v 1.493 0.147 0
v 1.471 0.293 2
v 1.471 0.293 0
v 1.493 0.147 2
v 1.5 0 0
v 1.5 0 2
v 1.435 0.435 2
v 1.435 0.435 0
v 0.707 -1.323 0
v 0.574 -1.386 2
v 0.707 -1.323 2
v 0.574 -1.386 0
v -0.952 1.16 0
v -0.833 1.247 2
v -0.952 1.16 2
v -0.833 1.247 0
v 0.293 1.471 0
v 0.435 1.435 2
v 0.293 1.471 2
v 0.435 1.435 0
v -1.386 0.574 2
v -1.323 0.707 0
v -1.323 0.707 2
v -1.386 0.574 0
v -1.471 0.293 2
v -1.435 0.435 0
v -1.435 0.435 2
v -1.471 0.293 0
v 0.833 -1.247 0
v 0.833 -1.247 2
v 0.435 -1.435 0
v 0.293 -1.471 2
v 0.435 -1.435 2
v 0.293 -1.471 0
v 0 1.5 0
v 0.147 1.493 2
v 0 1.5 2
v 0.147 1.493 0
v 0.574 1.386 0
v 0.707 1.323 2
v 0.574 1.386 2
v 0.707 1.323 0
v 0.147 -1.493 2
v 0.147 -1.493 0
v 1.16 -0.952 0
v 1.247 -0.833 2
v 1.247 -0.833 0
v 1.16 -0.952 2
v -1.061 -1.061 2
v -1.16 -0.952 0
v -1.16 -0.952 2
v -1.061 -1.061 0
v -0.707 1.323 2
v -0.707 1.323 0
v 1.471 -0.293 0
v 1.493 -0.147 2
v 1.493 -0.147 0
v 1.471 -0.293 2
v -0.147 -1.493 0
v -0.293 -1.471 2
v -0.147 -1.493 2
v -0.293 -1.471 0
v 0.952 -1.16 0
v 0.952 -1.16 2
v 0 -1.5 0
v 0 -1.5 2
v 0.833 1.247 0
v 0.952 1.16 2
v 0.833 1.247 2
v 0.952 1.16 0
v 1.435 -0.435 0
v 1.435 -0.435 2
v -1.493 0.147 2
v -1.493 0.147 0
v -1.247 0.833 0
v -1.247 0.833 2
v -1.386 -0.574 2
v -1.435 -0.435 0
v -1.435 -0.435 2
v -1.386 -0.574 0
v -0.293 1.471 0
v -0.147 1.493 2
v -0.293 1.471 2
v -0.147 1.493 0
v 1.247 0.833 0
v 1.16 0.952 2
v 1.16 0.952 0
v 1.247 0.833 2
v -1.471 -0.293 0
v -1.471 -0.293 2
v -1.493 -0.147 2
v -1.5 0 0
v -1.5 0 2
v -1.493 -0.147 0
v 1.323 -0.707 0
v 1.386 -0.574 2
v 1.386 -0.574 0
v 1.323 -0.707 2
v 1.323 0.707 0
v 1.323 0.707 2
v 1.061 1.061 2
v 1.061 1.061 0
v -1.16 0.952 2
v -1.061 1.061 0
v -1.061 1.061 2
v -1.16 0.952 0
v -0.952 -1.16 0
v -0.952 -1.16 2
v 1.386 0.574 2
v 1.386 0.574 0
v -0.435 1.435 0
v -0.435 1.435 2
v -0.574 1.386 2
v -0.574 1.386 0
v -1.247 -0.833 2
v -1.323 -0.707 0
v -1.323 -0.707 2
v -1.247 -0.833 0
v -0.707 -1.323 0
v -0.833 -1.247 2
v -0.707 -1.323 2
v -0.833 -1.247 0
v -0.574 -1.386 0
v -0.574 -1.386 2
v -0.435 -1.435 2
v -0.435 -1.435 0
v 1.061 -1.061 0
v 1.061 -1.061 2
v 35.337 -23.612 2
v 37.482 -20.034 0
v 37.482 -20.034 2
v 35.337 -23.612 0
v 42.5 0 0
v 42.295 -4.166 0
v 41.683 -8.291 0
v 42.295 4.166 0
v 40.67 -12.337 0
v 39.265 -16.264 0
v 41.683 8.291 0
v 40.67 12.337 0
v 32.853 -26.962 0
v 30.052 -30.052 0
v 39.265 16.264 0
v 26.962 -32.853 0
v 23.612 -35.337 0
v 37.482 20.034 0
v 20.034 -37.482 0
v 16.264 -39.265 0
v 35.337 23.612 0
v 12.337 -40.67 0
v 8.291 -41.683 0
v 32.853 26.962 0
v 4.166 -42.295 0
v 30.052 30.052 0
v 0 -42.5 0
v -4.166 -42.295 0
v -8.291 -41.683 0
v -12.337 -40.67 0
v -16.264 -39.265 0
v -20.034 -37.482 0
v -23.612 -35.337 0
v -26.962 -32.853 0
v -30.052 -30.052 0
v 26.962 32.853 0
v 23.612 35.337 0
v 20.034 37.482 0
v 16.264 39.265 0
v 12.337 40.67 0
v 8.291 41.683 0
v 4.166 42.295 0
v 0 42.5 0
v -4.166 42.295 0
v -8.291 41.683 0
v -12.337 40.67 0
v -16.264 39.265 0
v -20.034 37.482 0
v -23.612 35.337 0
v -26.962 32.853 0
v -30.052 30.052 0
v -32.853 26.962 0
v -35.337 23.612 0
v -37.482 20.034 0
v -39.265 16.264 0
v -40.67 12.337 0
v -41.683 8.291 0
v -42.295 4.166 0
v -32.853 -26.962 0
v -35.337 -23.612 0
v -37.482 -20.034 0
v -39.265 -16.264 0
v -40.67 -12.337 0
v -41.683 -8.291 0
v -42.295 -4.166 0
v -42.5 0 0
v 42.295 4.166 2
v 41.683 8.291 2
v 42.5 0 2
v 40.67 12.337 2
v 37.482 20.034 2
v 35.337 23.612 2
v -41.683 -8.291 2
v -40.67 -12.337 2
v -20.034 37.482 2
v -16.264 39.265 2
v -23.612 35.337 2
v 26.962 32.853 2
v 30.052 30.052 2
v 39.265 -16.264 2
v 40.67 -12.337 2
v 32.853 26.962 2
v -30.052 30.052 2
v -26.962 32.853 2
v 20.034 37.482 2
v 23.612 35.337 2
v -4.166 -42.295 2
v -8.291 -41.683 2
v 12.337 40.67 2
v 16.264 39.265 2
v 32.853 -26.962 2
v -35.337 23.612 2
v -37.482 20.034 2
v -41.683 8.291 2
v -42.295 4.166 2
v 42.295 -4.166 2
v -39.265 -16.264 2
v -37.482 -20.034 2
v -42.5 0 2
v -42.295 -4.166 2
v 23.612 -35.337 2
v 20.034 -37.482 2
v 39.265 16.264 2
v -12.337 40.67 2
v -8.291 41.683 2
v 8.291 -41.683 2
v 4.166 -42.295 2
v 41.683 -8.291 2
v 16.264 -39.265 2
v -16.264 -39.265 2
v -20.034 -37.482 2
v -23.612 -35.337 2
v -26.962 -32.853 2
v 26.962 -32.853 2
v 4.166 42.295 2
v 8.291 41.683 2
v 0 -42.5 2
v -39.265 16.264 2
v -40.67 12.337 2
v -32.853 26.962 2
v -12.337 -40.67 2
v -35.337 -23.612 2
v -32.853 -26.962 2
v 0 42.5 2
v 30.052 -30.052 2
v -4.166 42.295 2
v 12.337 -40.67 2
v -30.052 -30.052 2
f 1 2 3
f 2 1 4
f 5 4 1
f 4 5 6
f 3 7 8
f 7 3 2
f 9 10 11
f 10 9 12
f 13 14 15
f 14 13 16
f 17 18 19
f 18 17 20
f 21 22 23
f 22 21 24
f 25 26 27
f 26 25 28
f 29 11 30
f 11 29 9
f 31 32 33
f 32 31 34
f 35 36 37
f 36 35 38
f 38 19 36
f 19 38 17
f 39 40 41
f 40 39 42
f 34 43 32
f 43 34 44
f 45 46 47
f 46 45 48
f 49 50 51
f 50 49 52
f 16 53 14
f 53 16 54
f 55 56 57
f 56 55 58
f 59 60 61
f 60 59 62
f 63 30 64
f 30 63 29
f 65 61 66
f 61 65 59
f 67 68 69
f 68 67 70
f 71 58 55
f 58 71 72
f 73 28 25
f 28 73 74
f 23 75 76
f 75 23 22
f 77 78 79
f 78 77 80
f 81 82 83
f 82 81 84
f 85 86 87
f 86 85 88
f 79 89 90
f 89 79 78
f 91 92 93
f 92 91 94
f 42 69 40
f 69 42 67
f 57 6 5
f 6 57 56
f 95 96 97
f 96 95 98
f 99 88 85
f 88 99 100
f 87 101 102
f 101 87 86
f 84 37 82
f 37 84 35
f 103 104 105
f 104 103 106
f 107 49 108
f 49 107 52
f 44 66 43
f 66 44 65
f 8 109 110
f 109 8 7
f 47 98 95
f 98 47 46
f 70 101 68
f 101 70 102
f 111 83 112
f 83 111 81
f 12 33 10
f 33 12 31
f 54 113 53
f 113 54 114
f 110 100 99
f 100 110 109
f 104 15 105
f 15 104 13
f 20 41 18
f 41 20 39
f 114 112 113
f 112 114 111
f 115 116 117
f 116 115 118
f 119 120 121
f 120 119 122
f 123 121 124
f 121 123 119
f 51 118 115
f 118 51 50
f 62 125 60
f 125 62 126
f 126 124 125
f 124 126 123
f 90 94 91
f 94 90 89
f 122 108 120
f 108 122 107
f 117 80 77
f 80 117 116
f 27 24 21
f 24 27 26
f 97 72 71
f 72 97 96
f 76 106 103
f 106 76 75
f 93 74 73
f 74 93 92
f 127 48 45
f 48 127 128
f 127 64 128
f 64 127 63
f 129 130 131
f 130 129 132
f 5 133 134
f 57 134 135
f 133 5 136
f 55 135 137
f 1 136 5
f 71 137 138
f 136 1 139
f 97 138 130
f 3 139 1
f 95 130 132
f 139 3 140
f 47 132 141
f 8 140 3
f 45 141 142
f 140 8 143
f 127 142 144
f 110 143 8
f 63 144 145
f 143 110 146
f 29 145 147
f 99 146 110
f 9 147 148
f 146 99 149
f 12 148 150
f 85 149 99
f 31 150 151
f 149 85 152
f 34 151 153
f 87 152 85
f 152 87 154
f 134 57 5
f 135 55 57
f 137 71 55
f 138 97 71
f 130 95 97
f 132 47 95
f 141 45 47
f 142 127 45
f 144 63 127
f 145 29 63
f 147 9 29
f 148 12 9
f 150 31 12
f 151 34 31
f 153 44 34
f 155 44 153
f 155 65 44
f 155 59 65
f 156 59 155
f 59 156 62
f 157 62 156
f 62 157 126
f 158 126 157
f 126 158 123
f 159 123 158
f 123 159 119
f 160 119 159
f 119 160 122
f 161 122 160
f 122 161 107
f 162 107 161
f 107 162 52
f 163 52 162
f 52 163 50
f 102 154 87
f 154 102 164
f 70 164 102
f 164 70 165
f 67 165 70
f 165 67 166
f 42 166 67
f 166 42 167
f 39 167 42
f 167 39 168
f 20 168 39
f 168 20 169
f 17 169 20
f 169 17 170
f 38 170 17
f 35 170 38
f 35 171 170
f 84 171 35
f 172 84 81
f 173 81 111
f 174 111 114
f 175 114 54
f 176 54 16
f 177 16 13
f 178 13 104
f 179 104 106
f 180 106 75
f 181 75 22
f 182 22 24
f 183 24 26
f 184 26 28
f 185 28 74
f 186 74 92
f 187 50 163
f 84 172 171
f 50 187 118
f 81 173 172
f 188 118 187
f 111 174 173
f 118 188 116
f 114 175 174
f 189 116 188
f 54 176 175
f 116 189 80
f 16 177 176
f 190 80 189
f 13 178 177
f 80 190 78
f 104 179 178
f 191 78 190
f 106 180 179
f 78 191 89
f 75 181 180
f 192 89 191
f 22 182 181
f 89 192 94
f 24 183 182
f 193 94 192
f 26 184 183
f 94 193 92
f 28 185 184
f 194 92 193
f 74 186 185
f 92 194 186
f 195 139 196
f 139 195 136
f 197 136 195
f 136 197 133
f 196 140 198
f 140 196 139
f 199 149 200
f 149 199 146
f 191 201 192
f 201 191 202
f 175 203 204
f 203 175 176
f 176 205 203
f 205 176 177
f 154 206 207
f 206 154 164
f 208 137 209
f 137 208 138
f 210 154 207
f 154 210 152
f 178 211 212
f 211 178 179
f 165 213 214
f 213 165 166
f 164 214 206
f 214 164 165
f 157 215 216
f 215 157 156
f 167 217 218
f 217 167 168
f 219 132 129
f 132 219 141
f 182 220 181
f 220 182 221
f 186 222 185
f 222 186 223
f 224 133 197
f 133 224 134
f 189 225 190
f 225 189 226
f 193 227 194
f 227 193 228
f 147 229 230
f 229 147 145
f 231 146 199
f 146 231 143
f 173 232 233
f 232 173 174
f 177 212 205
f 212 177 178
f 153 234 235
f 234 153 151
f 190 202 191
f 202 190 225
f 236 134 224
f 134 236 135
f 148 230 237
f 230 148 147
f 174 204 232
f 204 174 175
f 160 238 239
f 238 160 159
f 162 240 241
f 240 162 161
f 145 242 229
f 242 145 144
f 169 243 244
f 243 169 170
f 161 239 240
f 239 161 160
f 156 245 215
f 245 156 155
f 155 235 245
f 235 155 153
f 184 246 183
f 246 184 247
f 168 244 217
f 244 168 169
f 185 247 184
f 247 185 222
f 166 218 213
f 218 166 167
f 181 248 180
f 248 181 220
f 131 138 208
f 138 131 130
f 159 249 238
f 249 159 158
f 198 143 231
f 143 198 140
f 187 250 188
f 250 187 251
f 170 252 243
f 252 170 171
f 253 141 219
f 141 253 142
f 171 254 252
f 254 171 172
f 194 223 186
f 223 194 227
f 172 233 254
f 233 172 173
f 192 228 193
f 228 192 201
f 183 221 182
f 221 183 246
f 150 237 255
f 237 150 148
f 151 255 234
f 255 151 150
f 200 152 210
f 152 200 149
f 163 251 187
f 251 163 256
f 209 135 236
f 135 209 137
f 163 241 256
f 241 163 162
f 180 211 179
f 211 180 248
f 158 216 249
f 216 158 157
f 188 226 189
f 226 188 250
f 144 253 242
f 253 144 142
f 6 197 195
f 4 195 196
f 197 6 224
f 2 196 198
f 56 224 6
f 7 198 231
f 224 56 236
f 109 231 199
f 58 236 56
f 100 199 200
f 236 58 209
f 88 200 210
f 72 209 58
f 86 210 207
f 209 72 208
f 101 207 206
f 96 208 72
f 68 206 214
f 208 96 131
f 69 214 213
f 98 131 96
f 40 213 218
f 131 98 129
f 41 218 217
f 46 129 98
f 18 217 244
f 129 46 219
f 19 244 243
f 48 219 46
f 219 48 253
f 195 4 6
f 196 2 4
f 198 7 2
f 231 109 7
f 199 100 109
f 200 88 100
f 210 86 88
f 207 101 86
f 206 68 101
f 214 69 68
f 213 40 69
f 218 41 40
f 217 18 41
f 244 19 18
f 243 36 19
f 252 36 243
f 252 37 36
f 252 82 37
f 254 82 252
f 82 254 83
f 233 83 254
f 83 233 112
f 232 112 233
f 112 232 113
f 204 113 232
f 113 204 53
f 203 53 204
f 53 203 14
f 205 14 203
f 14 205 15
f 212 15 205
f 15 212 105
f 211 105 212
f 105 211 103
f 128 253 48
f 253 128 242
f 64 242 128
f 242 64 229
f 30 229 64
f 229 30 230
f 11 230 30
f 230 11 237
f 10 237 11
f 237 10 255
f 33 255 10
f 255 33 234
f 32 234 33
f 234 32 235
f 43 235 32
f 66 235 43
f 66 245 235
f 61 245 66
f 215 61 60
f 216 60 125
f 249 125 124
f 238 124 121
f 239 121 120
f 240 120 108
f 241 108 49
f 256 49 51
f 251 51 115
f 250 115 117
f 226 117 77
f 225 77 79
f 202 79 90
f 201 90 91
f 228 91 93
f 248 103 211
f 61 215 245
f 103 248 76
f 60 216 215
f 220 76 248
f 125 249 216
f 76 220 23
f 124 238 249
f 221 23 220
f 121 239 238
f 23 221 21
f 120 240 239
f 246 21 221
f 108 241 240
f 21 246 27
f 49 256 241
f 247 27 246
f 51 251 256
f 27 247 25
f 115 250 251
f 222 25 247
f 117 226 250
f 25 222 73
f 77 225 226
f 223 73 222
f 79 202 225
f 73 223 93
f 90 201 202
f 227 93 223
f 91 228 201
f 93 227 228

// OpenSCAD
// Built by bench/smallmodels/features/compiler.py from a list of features.
$fn = 64;
difference() {
  union() {
    translate([0, 0, 0]) cylinder(d = 85, h = 2);
  }
  union() {
    translate([0, 0, -0.01]) rotate([0, 0, 0]) cylinder(d = 3, h = 2.02);
    translate([0, 85, 0]) rotate([0, 0, 0]) translate([-5, -2, 0]) cube([10, 4, 2]);
  }
}
